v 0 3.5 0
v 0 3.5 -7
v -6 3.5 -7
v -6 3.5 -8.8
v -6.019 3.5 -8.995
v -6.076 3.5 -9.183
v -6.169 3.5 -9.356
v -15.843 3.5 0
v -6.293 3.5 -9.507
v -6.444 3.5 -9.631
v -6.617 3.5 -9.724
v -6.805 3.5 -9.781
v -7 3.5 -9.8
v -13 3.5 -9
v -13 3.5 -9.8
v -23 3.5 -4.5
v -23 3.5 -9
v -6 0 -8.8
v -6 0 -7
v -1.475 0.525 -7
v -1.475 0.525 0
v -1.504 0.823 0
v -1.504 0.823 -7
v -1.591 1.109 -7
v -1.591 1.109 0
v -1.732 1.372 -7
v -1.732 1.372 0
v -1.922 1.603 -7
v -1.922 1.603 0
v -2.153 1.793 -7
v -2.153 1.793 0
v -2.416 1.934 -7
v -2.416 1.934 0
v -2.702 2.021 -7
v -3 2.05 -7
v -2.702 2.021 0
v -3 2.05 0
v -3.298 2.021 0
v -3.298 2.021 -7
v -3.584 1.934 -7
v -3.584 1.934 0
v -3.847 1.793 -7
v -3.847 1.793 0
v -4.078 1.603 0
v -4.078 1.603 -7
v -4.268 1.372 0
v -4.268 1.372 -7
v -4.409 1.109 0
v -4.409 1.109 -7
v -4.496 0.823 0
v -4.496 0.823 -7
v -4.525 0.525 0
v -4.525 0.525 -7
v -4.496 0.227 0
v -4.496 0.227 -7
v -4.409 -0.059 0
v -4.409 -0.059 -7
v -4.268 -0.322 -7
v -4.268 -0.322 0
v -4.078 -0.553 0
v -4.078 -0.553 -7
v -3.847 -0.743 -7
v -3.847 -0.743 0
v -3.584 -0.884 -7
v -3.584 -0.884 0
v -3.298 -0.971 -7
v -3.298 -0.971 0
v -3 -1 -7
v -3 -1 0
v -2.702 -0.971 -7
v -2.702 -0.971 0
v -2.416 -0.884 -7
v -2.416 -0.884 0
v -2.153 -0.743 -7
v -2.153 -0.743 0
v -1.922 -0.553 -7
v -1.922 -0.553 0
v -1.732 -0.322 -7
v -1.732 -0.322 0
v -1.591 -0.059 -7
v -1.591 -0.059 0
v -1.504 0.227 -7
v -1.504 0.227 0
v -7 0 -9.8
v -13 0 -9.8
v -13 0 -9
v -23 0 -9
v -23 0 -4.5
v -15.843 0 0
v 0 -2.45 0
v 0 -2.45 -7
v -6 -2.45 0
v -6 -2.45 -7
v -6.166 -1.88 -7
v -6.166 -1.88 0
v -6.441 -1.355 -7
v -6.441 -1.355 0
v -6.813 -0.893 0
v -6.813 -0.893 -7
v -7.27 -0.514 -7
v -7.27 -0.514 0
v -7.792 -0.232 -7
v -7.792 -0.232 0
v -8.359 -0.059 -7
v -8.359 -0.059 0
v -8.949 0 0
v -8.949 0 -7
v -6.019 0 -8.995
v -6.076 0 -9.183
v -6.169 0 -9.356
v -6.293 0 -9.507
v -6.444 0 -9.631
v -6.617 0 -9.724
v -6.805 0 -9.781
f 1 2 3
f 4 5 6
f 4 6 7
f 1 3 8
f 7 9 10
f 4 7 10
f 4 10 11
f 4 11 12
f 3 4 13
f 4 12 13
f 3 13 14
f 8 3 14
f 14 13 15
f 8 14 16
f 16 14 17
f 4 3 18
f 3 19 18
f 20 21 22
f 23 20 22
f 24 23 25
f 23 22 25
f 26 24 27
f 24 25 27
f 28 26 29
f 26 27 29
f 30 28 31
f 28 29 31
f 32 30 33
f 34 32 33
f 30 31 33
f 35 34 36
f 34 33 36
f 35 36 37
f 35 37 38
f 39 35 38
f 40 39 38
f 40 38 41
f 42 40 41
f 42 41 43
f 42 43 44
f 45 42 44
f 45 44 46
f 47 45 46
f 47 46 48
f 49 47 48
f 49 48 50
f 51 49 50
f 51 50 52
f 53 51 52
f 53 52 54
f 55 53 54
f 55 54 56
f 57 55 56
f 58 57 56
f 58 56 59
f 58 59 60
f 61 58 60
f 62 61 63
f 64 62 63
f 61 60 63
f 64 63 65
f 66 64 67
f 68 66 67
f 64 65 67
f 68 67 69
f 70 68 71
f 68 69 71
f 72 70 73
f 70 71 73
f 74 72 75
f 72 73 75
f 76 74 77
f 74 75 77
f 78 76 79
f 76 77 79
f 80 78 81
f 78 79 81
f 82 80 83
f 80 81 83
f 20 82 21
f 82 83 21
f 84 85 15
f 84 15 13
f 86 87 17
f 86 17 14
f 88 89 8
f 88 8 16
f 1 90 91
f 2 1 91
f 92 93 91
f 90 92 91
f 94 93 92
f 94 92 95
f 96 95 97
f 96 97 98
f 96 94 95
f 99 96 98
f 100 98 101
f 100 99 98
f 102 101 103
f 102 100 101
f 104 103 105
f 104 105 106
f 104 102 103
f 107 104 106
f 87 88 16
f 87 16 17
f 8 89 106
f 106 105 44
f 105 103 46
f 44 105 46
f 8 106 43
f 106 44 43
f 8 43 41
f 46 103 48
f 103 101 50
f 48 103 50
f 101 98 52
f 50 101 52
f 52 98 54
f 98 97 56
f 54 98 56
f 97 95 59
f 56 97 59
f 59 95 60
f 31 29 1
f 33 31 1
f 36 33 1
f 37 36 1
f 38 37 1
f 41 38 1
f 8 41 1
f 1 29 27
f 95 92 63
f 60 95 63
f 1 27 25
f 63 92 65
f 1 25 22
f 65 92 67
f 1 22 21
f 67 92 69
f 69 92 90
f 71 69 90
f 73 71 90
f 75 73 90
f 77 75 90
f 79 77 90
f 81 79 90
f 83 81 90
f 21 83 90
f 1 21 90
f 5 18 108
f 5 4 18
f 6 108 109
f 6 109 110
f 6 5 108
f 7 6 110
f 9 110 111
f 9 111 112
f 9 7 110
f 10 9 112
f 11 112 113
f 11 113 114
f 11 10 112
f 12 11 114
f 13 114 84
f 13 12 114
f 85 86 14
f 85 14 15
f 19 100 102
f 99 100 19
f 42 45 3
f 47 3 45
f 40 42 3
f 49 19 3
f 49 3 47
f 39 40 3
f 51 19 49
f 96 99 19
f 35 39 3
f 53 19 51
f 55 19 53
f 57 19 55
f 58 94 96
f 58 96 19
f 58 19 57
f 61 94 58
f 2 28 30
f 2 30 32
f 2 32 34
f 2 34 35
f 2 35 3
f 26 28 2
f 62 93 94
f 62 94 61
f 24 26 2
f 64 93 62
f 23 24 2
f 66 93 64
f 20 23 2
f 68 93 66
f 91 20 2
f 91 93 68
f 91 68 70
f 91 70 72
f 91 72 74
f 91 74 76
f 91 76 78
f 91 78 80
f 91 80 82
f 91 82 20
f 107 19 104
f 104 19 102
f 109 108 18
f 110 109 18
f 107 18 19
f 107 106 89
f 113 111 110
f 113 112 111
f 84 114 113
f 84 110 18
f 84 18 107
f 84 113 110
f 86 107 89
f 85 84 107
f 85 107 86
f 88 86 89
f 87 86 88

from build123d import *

# Parameters (mm, degrees)
EXTRUDE_1_DEPTH          = 3.5
EXTRUDE_2_DEPTH          = 3.5
EXTRUDE_2_DEPTH_BACK     = 2.45
SKETCH_3_W               = 6
SKETCH_3_H               = 9
CUT_EXTRUDE_1_DEPTH      = 26.244603384
CUT_EXTRUDE_1_DEPTH_BACK = 26.244603384
SKETCH_4_W               = 6
SKETCH_4_H               = 2
SKETCH_5_R               = 1.525
CUT_EXTRUDE_2_DEPTH      = 26.244603384
FILLET_2_R               = 1
FILLET_3_R               = 3


with BuildPart() as part:
    # 草图1 → 凸台-拉伸1 (new body)
    with BuildSketch(Plane(origin=(0, 0, 0), x_dir=(1, 0, 0), z_dir=(0, 1, 0))):
        Polygon((0, 0), (-6, 0), (-15.842640781, 0), (-23, 4.5), (-23, 9), (-13, 9), (-13, 9.8), (-6, 9.8), (-6, 9), (0, 9), align=None)
    extrude(amount=EXTRUDE_1_DEPTH)

    # 草图3 → 凸台-拉伸2 (add, two sides: drawn at the far end of the back side and taken through both)
    with BuildSketch(Plane(origin=(0, 0, 0), x_dir=(1, 0, 0), z_dir=(0, 1, 0)).offset(-EXTRUDE_2_DEPTH_BACK)):
        with Locations((-3, 4.5)):
            Rectangle(SKETCH_3_W, SKETCH_3_H)
    extrude(amount=EXTRUDE_2_DEPTH + EXTRUDE_2_DEPTH_BACK)

    # 草图4 → 切除-拉伸1 (cut, two sides: drawn at the far end of the back side and taken through both)
    with BuildSketch(Plane(origin=(0, 0, 0), x_dir=(1, 0, 0), z_dir=(0, 1, 0)).offset(-CUT_EXTRUDE_1_DEPTH_BACK)):
        with Locations((-3, 8)):
            Rectangle(SKETCH_4_W, SKETCH_4_H)
    extrude(amount=CUT_EXTRUDE_1_DEPTH + CUT_EXTRUDE_1_DEPTH_BACK, mode=Mode.SUBTRACT)

    # 草图5 → 切除-拉伸2 (cut, through all)
    with BuildSketch(Plane.XY):
        with Locations((-3, 0.525)):
            Circle(SKETCH_5_R)
    extrude(amount=-CUT_EXTRUDE_2_DEPTH, mode=Mode.SUBTRACT)

    # 圆角2
    fillet_2_edges = [part.edges().sort_by_distance(p)[0] for p in [
        (-6, 1.75, -9.8),
    ]]
    fillet(fillet_2_edges, radius=FILLET_2_R)

    # 圆角3
    # the kernel refuses this fillet: 3 mm, written as the material it adds along each edge
    with BuildSketch(Plane(origin=(-6, 0, -7), x_dir=(-1, 0, 0), z_dir=(0, 0, 1))) as fillet_3_piece_1:
        with BuildLine():
            CenterArc((2.949152421, 3), FILLET_3_R, 190.563977589, 79.436022411)
            Line((0, 2.45), (0, 0))
            Line((0, 0), (2.949152421, 0))
        make_face()
    extrude(amount=7)


solid = part.part
